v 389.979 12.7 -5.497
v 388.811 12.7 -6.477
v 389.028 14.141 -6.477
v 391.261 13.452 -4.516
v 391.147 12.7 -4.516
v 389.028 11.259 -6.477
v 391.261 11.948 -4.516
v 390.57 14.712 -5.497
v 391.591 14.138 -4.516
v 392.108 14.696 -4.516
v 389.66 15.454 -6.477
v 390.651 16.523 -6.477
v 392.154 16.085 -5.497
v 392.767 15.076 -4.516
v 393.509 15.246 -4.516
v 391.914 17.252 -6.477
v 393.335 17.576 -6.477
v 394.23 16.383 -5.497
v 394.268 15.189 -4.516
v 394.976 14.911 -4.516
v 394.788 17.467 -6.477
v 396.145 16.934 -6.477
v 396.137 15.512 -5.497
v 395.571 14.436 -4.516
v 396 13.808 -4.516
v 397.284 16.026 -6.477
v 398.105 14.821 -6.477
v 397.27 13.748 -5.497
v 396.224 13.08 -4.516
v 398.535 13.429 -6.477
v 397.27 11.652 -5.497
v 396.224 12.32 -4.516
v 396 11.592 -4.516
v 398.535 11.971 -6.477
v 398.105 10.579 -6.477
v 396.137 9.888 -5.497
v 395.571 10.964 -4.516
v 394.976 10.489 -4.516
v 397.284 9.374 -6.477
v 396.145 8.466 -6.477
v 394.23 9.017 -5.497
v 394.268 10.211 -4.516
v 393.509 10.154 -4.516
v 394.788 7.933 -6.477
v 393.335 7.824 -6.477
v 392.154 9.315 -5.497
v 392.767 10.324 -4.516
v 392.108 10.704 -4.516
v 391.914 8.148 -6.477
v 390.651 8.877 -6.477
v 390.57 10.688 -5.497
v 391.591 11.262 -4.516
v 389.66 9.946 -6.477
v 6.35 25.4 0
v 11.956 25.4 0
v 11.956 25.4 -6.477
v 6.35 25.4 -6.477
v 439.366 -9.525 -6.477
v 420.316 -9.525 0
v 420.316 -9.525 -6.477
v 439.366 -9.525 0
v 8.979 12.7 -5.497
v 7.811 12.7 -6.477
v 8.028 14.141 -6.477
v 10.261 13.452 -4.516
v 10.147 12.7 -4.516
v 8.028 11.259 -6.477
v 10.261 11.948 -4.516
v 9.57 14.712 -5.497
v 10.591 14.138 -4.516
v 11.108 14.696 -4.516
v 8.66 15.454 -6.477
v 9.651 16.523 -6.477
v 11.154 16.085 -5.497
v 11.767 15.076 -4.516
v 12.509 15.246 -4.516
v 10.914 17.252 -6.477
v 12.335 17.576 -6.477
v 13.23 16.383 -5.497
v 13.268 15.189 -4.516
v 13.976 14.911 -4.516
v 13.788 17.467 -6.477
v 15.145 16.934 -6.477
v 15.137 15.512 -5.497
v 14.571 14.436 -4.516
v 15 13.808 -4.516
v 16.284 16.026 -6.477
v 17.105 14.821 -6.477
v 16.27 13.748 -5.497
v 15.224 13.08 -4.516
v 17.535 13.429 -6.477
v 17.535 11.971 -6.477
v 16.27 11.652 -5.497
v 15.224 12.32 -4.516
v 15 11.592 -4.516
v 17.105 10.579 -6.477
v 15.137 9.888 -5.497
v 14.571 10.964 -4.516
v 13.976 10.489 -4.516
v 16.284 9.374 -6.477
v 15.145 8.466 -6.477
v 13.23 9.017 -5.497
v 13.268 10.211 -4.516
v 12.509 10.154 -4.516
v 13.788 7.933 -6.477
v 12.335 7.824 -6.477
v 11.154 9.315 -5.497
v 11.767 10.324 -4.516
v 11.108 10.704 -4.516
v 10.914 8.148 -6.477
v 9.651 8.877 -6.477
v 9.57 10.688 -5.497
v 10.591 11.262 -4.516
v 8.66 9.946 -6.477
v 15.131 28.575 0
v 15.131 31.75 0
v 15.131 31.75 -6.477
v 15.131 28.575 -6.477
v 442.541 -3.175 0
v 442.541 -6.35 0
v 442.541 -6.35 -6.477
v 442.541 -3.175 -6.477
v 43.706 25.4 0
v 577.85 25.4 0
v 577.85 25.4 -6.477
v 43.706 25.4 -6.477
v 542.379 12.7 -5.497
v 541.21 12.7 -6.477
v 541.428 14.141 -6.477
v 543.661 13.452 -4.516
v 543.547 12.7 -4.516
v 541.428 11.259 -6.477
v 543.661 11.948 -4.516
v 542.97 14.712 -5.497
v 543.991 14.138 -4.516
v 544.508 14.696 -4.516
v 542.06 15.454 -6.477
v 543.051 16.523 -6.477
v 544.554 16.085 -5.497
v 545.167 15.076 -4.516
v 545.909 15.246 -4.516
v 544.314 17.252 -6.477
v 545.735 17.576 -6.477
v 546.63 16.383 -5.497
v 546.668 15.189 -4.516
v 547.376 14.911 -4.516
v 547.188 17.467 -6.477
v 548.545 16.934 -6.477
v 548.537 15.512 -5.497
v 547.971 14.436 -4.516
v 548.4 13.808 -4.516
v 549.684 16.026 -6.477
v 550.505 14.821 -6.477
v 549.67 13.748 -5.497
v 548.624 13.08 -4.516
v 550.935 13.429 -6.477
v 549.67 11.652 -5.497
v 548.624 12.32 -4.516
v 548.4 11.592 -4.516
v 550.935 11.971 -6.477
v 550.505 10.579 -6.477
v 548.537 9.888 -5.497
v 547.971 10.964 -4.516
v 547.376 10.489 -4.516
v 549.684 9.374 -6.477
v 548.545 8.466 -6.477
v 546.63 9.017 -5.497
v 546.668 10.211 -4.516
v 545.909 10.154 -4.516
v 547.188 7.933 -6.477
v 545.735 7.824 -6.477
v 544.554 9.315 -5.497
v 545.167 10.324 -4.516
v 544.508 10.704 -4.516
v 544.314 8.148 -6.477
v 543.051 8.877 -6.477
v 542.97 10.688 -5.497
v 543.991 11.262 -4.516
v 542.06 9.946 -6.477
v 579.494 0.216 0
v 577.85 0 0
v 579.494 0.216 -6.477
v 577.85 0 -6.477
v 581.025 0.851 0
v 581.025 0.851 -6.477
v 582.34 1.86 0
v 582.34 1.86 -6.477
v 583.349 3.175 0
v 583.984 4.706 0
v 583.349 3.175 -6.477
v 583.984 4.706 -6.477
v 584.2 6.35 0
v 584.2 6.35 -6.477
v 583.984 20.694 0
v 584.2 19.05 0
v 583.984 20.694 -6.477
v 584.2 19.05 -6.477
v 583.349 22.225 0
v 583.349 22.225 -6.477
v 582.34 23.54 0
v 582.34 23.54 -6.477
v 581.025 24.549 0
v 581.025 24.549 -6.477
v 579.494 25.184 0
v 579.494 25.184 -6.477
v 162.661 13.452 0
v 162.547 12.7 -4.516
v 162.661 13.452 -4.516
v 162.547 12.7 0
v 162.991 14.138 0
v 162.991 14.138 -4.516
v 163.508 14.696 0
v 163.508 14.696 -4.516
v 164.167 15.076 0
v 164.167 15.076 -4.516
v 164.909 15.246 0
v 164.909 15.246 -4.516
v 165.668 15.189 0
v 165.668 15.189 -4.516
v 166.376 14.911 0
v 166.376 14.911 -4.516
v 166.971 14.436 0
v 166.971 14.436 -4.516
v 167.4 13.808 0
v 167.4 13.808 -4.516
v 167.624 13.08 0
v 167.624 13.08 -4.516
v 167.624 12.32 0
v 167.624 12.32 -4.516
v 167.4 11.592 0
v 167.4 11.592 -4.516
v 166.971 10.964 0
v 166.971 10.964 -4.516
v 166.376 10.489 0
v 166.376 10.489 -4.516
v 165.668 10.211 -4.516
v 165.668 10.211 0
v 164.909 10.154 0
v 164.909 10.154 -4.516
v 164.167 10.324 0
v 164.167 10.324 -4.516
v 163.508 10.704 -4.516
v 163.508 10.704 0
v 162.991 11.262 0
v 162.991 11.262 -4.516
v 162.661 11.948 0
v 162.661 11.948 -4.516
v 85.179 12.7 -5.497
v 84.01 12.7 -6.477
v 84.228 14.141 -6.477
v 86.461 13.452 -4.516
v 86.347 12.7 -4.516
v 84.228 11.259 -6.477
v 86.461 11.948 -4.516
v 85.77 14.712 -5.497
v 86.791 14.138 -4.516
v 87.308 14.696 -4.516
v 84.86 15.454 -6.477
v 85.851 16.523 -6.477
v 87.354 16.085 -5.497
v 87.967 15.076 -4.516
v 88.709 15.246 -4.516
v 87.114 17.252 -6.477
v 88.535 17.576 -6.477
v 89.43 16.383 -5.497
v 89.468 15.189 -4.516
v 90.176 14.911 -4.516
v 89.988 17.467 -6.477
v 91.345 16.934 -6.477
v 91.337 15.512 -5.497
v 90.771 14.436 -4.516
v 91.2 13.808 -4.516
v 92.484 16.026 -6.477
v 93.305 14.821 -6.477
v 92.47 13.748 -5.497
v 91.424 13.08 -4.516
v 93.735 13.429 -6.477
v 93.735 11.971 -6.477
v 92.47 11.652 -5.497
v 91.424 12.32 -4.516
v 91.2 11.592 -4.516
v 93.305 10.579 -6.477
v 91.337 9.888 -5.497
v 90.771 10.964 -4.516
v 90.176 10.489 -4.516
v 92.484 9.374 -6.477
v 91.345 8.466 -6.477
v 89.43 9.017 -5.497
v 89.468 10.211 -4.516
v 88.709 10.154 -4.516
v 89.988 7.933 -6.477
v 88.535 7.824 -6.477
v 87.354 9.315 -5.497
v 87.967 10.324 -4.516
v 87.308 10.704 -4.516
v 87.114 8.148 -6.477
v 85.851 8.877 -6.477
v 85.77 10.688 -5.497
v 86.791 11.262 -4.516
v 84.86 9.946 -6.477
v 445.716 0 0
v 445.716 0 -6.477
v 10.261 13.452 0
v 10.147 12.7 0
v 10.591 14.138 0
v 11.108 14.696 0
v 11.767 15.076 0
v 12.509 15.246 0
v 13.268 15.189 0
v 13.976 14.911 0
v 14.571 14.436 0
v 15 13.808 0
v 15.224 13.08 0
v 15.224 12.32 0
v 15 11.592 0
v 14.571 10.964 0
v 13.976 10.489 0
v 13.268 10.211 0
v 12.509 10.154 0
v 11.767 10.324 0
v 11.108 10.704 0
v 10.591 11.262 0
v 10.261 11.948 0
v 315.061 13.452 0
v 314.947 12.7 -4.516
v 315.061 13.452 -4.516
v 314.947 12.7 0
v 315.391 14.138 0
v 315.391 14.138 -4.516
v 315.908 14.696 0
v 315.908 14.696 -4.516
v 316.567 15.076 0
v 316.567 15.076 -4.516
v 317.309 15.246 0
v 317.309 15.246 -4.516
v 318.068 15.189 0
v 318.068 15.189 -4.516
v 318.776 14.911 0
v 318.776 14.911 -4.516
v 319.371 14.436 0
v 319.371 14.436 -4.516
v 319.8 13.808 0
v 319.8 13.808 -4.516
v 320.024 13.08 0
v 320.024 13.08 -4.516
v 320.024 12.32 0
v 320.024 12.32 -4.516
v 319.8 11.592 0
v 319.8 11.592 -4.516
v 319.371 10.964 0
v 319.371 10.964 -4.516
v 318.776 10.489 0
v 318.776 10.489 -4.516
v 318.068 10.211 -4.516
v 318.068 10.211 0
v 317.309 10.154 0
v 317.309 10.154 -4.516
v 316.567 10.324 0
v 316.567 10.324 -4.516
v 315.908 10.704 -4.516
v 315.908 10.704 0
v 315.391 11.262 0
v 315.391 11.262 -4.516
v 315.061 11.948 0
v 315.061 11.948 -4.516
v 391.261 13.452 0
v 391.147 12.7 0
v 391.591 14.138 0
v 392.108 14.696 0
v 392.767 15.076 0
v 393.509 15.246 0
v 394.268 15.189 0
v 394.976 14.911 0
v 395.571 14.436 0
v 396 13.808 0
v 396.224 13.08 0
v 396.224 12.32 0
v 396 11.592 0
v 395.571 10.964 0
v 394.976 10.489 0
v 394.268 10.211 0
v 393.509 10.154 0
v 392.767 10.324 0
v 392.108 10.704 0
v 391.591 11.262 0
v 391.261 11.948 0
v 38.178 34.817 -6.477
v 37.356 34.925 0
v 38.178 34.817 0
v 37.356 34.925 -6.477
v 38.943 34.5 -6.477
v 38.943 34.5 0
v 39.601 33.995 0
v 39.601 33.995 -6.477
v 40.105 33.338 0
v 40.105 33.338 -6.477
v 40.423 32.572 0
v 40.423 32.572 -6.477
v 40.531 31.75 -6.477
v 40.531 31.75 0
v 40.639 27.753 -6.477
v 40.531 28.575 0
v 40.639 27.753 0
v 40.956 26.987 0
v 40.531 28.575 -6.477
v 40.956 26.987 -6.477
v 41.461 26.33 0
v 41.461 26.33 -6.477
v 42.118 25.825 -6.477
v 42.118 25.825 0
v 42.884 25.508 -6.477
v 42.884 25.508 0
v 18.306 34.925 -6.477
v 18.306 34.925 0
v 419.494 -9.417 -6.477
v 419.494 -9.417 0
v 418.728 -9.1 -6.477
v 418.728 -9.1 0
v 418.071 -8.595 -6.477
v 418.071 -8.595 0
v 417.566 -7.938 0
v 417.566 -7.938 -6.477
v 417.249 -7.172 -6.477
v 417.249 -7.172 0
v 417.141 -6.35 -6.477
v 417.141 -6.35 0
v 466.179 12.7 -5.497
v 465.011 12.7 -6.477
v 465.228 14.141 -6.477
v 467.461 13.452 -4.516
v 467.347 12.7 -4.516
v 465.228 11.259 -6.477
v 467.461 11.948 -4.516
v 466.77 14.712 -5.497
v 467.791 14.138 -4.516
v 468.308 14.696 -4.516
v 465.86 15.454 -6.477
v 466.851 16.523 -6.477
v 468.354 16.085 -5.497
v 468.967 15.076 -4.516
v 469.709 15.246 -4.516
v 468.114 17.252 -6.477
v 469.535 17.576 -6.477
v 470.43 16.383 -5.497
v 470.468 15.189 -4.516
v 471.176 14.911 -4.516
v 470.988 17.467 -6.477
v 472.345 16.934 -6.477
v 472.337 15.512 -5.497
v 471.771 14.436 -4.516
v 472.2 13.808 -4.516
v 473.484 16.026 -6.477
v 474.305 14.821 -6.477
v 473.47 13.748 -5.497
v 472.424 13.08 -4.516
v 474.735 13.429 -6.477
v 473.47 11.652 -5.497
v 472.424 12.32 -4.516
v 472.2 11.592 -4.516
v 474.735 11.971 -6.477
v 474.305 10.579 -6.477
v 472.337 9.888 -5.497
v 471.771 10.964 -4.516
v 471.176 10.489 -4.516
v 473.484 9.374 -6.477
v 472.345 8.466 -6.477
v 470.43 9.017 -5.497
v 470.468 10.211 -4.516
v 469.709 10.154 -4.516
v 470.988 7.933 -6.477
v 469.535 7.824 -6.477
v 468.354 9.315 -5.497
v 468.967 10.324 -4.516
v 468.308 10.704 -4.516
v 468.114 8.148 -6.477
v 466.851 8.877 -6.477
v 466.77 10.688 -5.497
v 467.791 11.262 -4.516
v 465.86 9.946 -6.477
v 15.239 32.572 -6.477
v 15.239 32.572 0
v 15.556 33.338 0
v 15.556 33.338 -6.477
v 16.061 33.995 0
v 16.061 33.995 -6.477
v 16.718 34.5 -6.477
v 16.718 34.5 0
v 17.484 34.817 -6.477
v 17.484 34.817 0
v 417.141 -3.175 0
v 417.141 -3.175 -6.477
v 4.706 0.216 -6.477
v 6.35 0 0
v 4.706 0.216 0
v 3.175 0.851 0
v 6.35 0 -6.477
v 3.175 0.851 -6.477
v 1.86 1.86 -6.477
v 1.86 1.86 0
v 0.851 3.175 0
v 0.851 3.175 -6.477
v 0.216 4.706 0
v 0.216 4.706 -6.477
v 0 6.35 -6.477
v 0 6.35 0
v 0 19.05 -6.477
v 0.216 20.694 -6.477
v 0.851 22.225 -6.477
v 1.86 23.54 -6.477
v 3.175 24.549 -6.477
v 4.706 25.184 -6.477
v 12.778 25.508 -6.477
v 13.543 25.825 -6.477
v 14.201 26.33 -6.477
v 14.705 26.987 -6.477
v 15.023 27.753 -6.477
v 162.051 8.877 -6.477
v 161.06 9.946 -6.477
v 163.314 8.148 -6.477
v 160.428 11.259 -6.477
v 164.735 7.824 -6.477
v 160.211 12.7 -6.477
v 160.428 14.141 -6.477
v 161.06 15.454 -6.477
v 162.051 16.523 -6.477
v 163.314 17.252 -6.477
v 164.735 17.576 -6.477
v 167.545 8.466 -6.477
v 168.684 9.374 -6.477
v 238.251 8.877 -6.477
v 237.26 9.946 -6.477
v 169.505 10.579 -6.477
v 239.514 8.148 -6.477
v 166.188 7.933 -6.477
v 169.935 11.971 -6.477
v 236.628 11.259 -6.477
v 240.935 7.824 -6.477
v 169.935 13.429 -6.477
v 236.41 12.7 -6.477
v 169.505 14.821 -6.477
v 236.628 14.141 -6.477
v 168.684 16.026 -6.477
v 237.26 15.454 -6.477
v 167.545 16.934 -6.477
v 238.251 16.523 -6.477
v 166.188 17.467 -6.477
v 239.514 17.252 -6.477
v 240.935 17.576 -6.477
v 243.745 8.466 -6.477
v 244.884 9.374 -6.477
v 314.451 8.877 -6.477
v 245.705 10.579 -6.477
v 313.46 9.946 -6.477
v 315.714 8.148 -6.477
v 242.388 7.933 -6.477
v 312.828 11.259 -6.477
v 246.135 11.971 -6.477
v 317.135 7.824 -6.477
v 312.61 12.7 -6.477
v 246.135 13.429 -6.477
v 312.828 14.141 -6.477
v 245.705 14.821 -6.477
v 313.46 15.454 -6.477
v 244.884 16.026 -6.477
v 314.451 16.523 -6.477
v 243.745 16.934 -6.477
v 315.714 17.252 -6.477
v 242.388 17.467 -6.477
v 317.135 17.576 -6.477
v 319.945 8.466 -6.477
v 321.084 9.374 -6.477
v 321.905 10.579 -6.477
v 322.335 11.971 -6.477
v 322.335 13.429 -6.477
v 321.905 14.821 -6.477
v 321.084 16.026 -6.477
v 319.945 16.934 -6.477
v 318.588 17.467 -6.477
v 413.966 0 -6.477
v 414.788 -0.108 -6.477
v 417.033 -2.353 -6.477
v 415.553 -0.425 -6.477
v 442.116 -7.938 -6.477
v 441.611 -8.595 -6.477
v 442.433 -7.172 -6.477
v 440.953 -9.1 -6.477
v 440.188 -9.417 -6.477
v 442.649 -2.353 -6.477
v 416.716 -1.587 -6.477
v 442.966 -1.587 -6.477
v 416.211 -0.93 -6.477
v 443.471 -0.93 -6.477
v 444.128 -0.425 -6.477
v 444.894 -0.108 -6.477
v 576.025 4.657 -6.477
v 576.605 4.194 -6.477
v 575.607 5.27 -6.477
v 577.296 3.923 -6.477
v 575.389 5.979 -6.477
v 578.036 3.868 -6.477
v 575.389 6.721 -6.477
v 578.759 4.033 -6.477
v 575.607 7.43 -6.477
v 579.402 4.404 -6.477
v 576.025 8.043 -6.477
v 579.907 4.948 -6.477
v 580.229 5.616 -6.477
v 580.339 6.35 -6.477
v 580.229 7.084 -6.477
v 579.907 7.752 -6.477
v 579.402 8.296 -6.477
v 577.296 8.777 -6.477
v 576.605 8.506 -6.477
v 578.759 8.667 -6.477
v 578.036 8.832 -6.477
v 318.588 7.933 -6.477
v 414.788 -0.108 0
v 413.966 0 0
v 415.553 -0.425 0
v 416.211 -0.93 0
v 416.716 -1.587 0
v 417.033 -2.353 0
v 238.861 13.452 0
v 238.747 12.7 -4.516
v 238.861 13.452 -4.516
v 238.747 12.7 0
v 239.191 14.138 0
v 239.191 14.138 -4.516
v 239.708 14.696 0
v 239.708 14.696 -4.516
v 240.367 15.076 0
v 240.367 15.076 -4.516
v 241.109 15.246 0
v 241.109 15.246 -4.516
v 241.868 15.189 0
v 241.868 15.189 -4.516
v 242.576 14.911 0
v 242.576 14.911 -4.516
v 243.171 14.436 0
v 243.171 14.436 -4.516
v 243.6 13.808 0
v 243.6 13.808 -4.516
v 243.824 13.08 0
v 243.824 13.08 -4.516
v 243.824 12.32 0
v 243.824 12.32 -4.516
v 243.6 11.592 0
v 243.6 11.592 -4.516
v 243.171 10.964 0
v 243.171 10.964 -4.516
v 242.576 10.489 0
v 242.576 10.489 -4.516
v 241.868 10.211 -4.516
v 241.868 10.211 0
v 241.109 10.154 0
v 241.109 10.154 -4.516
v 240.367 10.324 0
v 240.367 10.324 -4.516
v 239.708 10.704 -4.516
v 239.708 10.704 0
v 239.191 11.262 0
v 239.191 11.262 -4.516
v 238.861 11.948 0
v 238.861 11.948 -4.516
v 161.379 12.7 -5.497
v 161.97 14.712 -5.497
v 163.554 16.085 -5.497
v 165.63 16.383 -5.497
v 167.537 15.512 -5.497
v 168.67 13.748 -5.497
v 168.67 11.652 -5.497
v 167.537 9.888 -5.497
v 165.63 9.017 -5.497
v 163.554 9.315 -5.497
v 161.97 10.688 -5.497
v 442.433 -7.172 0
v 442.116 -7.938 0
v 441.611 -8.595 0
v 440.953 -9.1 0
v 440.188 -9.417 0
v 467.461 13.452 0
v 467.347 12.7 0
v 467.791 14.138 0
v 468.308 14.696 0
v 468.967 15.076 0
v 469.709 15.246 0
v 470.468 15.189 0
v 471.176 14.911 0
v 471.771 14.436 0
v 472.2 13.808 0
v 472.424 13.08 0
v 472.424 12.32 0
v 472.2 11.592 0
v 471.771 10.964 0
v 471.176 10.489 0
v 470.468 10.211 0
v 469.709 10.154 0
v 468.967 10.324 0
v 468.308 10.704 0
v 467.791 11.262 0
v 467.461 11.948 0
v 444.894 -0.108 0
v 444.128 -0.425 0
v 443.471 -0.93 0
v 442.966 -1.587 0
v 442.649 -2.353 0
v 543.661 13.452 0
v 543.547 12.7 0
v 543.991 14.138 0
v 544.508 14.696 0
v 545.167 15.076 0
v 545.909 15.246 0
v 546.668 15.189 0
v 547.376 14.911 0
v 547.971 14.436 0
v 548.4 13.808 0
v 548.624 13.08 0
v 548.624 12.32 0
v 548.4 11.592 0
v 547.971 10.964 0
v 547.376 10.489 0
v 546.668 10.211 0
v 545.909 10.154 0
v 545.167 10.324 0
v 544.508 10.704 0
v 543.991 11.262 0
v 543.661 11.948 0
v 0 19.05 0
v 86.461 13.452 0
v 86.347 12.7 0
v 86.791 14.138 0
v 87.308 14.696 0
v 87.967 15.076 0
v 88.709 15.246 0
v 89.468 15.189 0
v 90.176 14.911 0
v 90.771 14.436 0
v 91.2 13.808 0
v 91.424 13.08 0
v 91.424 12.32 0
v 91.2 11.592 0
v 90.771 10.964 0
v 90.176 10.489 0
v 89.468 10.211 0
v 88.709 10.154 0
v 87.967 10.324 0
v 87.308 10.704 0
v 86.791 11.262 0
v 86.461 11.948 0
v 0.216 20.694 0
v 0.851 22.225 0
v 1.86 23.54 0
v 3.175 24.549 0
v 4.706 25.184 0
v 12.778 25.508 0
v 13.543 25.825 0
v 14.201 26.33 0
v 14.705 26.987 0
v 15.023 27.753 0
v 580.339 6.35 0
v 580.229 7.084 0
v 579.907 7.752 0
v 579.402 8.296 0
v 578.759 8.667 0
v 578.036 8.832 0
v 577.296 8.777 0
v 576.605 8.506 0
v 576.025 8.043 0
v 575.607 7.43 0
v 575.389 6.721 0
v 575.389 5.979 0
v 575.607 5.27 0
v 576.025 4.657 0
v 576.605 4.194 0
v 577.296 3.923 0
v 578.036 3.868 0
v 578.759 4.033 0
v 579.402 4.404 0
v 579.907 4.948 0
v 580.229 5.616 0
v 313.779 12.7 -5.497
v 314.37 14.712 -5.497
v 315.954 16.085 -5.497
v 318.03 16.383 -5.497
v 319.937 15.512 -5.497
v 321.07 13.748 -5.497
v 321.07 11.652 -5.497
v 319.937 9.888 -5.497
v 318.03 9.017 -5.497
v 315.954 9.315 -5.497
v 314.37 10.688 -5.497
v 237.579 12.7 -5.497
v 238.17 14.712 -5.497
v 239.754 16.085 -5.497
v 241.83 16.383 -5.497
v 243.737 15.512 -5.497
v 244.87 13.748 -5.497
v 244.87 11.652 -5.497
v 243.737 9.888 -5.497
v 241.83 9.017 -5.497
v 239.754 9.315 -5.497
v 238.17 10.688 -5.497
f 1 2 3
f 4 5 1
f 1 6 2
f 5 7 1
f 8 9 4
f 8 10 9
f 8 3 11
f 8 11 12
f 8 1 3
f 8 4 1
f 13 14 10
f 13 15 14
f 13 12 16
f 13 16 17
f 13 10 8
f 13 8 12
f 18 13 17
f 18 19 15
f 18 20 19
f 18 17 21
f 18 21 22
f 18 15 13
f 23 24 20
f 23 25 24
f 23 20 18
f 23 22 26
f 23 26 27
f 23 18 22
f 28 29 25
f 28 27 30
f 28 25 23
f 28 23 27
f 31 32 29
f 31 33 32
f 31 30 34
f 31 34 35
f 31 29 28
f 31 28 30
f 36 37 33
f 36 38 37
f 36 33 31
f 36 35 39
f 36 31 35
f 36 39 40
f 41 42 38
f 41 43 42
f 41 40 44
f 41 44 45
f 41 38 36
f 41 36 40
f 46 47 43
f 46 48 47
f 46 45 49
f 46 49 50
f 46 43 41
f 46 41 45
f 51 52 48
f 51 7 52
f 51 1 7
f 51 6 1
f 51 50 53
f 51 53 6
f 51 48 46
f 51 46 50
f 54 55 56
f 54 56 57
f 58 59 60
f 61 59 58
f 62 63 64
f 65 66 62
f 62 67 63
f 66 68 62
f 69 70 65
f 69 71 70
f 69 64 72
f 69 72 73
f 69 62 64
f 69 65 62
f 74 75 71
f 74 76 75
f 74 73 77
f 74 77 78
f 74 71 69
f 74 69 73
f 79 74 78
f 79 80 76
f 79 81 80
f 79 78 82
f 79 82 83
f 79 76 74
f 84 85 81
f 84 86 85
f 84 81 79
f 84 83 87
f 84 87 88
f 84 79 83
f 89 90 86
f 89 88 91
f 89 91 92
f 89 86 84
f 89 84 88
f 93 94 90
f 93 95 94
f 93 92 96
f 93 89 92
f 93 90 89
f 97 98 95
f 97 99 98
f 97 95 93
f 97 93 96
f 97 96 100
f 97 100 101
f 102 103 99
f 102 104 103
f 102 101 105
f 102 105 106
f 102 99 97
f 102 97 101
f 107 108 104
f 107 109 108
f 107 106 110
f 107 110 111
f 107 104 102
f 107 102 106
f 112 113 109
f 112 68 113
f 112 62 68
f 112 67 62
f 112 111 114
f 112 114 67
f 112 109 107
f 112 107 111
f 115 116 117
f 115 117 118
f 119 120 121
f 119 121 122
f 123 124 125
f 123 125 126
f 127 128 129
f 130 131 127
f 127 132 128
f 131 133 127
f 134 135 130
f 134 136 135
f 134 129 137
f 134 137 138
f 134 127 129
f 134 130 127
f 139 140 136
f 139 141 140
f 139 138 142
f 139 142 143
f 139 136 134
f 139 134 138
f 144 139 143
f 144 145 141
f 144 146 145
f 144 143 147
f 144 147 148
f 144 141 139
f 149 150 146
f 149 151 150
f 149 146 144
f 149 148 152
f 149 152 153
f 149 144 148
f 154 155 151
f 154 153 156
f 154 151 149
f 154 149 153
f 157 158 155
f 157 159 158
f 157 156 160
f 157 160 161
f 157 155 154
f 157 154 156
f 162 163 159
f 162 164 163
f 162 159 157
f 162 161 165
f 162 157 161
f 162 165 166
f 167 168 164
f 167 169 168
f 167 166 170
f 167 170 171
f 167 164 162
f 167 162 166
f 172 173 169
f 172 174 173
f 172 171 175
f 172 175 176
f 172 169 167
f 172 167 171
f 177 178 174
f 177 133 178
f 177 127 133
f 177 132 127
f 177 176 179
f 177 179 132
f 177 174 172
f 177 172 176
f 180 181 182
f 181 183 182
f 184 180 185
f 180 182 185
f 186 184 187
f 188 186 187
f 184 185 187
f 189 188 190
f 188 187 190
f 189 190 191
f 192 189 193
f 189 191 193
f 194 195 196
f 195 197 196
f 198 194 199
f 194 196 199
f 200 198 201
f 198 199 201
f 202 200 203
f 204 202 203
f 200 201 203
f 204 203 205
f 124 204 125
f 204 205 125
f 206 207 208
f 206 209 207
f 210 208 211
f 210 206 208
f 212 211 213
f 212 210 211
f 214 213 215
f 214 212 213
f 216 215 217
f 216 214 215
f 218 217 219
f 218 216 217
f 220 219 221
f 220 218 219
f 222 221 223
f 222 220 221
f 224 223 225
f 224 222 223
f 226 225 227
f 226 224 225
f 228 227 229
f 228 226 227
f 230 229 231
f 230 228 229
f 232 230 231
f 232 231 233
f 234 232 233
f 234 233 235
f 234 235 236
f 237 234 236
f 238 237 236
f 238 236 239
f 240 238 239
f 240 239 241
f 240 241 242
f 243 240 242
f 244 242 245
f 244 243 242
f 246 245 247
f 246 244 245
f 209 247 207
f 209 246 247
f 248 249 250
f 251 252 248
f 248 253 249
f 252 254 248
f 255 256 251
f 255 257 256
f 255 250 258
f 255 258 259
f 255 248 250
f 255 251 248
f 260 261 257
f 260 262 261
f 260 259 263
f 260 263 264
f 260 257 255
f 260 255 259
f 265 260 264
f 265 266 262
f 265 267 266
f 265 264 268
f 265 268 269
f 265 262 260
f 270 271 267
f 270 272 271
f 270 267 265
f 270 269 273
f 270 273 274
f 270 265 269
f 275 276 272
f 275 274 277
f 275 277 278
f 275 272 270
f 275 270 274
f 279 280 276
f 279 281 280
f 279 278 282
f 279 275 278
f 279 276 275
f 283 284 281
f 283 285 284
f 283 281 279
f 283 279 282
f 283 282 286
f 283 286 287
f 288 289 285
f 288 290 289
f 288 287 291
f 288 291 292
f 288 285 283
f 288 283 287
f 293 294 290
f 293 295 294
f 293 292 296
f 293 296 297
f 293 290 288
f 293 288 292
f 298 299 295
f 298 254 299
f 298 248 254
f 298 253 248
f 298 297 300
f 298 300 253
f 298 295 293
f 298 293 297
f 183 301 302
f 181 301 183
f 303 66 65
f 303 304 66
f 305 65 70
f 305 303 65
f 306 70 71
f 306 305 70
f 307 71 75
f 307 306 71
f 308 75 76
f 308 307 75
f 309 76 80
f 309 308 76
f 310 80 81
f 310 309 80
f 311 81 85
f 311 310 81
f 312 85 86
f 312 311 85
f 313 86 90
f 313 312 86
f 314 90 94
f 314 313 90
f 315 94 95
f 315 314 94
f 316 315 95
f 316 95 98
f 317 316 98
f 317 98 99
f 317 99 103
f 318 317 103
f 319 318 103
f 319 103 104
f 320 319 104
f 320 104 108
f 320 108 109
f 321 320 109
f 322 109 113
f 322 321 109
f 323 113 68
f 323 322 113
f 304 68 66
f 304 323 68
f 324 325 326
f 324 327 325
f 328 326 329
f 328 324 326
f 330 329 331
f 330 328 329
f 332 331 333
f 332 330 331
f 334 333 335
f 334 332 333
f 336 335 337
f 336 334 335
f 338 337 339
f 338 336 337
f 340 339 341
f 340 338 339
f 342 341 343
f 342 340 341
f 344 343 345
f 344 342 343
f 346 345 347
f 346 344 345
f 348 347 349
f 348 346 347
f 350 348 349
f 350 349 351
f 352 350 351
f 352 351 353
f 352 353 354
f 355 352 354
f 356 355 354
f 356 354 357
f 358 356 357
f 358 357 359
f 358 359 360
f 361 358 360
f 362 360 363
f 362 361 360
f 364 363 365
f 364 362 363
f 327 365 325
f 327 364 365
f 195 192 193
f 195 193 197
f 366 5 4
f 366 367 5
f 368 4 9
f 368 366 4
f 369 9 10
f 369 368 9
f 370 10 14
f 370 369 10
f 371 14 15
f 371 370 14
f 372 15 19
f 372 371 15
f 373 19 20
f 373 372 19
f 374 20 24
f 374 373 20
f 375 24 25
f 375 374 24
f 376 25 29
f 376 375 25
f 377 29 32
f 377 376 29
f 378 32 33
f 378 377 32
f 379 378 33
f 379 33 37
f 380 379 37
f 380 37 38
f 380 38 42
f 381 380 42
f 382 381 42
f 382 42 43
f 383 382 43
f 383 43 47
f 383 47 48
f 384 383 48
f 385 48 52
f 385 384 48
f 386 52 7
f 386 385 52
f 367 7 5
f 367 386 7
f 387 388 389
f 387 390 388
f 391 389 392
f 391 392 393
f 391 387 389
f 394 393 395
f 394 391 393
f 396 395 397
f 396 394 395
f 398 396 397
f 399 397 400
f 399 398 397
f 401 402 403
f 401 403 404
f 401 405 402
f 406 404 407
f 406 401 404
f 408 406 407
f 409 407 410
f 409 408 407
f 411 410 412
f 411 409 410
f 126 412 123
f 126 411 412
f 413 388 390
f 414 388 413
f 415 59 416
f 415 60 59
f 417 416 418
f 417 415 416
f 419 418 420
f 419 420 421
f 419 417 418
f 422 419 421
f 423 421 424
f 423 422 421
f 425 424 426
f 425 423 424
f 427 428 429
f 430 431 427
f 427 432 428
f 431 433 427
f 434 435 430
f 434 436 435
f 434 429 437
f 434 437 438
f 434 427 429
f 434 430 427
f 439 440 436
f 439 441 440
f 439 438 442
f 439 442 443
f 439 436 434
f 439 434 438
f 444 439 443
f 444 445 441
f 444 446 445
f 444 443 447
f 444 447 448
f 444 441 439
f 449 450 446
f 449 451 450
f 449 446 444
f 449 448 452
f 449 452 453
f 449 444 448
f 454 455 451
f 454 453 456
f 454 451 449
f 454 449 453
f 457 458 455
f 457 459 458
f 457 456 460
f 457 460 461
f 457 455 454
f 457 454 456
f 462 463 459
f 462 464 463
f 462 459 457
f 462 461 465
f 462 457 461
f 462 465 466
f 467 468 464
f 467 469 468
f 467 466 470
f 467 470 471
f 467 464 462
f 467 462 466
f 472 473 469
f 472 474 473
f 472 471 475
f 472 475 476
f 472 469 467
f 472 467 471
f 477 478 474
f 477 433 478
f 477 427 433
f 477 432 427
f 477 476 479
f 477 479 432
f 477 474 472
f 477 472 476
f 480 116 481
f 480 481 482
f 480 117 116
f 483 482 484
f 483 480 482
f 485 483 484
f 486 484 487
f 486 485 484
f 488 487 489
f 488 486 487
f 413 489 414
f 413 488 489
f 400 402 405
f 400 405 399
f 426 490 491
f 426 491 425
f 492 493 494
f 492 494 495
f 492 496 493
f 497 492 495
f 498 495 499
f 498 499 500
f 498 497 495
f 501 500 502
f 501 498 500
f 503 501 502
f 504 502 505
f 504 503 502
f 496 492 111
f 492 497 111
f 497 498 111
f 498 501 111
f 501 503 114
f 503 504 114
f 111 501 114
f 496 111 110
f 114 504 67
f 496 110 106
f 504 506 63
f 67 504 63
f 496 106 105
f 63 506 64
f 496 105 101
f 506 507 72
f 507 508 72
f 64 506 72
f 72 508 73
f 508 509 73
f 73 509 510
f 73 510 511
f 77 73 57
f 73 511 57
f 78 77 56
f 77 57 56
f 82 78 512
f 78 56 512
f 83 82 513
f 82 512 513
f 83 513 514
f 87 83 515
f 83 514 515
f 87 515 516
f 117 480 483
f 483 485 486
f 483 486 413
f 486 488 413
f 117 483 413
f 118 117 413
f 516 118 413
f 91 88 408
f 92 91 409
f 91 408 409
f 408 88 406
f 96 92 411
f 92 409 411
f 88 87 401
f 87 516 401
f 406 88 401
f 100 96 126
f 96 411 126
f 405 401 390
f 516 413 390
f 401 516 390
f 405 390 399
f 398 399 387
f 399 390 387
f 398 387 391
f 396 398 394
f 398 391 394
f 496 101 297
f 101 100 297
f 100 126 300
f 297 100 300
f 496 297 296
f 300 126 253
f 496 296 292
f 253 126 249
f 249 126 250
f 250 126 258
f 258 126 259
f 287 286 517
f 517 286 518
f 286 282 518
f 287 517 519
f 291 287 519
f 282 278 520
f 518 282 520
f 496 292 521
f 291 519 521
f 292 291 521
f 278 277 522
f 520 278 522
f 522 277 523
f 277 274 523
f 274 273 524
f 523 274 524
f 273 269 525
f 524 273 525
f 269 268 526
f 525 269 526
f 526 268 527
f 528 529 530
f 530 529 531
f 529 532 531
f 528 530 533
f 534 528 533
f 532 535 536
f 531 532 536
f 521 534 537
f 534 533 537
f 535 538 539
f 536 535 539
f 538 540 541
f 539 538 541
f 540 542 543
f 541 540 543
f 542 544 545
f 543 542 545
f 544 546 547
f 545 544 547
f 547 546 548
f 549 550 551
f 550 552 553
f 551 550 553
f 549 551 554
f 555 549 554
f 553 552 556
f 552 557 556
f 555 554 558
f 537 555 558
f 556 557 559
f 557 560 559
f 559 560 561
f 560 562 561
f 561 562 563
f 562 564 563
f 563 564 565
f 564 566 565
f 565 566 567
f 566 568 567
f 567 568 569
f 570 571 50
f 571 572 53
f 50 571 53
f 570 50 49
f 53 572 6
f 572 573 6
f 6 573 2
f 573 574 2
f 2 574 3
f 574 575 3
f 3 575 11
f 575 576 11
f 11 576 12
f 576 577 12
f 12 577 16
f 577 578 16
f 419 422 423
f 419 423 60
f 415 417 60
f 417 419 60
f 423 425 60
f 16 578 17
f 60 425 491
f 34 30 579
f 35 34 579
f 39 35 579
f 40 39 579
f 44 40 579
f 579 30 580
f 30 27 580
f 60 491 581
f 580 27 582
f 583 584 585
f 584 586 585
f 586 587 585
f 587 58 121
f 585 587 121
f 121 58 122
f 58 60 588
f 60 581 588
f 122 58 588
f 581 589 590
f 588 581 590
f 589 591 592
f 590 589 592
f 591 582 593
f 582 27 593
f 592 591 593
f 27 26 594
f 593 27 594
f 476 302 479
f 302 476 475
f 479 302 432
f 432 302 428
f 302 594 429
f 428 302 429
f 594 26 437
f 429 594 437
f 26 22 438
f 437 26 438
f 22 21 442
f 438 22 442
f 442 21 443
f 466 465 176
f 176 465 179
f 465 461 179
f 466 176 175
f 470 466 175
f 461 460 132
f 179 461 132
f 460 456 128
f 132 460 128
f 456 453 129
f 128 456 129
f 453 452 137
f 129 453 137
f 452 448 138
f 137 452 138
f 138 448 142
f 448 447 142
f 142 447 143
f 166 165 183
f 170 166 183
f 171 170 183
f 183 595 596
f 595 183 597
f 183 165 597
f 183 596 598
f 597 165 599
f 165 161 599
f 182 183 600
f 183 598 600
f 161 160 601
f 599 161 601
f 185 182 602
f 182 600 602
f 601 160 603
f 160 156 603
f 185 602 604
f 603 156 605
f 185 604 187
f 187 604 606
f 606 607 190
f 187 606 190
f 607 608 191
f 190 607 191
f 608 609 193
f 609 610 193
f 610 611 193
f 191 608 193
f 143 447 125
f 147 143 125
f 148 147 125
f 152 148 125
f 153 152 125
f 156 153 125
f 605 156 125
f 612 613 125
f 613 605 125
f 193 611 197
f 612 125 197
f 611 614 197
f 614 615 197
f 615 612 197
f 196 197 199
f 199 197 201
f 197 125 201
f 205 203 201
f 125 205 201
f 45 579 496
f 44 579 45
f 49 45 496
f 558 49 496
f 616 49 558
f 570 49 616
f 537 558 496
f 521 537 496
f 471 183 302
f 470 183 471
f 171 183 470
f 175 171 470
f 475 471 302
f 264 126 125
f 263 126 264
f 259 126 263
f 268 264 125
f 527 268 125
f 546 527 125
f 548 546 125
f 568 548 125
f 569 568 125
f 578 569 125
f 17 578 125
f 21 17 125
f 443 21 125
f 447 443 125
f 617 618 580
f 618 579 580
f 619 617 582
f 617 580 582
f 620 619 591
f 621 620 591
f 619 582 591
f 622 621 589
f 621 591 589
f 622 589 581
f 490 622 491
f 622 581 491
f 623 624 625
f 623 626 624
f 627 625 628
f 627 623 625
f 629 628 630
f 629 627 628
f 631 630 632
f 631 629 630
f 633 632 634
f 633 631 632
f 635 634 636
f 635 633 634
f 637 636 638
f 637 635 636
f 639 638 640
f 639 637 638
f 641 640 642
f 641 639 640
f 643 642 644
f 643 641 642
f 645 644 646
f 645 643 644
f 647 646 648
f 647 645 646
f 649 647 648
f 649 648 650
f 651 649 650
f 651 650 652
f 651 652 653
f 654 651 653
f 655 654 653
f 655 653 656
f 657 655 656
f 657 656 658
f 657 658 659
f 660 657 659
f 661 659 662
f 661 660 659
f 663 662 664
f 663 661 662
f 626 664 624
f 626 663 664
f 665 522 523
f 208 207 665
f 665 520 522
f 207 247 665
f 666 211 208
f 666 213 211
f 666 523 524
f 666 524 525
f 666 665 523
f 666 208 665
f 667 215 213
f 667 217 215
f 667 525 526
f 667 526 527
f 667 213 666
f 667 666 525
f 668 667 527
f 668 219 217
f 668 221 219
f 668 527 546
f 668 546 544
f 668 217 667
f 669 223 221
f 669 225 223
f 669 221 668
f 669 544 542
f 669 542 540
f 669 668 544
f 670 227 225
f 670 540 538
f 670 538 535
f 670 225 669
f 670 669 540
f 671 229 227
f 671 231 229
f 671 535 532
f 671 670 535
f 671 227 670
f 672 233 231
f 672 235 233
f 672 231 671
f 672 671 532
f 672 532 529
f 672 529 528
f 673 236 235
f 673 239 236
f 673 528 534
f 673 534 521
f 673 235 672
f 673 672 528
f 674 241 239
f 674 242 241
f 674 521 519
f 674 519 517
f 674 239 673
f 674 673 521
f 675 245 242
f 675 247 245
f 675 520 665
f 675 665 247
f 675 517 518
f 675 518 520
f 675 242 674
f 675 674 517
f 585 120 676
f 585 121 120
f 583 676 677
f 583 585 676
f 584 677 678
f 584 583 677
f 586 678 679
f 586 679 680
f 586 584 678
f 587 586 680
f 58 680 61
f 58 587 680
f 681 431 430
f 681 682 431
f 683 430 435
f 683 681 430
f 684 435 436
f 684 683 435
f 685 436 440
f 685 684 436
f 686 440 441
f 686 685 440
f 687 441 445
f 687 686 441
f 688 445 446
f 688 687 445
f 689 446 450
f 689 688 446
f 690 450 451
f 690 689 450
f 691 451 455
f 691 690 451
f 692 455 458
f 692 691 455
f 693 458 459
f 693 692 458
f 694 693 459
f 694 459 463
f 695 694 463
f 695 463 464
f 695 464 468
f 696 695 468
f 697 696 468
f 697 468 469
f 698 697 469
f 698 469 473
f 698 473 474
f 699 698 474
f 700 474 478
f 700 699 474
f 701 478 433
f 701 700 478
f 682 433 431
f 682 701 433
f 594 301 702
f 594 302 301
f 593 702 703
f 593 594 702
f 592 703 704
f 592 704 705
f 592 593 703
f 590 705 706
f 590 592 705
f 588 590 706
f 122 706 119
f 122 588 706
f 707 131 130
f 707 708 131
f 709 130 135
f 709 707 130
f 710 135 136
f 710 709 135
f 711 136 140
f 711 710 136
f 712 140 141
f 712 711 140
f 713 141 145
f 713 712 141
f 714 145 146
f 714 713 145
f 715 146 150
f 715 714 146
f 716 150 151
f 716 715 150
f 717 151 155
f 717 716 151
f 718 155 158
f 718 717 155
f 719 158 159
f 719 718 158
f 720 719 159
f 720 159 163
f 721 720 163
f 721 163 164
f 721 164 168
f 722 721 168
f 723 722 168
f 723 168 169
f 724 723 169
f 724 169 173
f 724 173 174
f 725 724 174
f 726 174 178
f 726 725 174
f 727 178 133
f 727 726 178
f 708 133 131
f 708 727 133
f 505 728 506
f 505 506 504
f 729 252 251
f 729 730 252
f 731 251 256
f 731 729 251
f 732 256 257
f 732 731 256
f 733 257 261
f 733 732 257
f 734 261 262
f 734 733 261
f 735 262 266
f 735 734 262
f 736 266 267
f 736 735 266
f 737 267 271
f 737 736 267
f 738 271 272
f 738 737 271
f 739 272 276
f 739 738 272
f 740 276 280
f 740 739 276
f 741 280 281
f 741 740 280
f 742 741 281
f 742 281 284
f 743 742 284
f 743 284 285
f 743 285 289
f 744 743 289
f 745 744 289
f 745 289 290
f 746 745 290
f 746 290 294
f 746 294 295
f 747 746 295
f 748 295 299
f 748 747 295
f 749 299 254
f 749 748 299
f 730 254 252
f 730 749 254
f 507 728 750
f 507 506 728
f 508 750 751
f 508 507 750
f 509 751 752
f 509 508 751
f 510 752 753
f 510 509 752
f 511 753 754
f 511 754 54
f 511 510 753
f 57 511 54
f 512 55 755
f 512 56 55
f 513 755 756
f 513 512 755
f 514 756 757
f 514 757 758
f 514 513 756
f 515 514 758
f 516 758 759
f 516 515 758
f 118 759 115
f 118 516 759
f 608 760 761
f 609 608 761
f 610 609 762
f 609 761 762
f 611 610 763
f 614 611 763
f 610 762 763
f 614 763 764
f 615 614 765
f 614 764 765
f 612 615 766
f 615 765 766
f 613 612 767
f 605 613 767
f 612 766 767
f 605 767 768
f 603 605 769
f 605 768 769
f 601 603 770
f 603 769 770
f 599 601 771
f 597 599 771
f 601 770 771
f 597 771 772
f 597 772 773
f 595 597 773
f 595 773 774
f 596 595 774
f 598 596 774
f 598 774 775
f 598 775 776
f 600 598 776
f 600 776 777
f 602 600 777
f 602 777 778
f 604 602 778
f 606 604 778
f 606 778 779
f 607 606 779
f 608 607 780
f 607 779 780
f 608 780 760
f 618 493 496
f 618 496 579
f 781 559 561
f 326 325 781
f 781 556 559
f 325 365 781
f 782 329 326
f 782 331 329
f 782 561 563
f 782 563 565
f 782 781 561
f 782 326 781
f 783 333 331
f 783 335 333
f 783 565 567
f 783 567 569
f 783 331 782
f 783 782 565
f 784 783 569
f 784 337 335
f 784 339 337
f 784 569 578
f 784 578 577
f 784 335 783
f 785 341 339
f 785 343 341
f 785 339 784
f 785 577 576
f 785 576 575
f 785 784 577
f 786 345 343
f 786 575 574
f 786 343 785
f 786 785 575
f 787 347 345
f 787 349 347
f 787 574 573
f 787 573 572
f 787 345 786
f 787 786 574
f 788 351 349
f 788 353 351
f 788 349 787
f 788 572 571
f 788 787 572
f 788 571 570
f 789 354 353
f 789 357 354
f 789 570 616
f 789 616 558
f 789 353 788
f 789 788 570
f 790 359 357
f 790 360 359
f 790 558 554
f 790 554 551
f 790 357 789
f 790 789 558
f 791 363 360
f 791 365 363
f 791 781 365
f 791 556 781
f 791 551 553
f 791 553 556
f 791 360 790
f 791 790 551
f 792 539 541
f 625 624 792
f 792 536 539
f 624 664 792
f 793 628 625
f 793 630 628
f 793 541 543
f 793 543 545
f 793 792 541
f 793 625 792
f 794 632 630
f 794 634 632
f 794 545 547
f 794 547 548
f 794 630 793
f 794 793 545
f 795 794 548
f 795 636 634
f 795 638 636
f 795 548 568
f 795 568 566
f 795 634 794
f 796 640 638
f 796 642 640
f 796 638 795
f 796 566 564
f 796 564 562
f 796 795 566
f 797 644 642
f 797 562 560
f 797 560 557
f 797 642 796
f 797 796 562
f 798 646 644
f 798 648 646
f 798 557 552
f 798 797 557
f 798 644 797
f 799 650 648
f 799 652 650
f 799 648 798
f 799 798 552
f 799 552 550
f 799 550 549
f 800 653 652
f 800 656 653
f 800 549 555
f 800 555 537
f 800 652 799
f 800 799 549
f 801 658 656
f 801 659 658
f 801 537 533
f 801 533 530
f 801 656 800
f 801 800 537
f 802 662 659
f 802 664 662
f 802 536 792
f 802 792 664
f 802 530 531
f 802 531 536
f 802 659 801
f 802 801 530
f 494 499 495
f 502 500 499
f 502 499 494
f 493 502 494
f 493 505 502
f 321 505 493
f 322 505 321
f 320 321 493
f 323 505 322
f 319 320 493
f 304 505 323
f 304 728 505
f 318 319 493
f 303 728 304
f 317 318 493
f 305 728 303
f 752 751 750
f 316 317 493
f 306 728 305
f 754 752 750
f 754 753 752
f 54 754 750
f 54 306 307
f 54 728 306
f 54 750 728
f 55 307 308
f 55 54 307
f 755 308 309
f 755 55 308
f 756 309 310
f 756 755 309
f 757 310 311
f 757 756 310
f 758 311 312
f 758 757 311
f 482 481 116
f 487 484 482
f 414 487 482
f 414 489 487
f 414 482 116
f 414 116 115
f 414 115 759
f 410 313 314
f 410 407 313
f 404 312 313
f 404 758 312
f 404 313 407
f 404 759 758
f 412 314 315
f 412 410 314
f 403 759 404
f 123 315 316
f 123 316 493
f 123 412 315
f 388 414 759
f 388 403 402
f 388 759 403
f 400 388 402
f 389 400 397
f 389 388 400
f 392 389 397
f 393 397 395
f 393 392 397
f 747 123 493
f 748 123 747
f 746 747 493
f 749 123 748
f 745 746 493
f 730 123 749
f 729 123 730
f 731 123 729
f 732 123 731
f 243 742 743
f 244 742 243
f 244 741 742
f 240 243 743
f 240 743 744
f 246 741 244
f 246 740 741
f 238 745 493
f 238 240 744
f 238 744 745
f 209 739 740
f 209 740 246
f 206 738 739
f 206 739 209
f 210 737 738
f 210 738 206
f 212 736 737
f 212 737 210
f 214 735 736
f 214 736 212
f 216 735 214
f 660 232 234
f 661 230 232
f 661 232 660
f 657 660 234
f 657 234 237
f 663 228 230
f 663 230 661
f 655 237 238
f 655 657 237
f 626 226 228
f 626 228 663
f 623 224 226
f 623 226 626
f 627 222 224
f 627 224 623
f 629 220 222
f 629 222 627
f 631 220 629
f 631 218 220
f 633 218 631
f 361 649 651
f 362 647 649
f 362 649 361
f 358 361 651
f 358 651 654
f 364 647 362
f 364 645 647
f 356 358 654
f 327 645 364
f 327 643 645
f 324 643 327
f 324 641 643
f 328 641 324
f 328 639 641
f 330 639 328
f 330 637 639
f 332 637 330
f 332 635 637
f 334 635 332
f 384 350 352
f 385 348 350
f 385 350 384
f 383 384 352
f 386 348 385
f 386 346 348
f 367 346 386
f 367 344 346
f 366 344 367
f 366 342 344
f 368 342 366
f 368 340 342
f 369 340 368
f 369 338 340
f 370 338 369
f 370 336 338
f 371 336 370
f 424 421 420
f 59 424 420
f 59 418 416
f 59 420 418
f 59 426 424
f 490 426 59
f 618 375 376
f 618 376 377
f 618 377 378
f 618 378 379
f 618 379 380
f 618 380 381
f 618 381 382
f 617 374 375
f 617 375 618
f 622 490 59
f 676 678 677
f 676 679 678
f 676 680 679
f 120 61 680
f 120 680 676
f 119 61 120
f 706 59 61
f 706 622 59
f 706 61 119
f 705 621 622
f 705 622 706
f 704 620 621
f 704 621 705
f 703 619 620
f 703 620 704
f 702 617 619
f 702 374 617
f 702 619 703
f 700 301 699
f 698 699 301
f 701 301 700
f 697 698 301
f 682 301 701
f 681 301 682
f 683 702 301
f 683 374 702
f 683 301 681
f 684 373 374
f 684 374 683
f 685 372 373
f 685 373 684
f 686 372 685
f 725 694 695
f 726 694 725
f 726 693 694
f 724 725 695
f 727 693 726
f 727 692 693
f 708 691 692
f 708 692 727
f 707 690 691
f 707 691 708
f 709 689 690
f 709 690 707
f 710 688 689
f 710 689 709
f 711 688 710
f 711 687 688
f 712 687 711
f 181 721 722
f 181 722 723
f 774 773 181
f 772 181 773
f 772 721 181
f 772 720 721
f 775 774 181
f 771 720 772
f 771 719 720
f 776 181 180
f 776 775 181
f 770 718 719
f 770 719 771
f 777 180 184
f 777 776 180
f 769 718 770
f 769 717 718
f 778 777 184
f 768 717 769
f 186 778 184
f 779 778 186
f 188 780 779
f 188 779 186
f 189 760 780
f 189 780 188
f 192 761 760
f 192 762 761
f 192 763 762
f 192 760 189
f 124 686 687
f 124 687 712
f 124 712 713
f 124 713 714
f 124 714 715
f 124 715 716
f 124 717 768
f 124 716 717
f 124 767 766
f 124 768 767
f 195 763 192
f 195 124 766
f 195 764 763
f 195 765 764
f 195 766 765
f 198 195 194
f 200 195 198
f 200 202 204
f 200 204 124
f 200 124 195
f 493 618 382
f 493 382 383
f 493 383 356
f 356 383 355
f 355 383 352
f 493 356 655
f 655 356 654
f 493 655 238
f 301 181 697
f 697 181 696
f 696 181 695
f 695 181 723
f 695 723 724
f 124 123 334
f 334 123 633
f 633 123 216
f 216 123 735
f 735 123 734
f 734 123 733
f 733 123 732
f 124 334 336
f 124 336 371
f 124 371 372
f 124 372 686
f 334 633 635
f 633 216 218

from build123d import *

# Parameters (mm, degrees)
SKETCH1_R                                          = 2.4892
BOSS_EXTRUDE1_DEPTH                                = 6.477
FILLET2_R                                          = 6.35
CSK_FOR_10_FLAT_HEAD_MACHINE_SCREW_100_D           = 5.1054
CSK_FOR_10_FLAT_HEAD_MACHINE_SCREW_100_CSINK_D     = 9.779
CSK_FOR_10_FLAT_HEAD_MACHINE_SCREW_100_CSINK_ANGLE = 100
LPATTERN1_COUNT                                    = 8
LPATTERN1_PITCH                                    = 76.2
FILLET3_R                                          = 3.175


with BuildPart() as part:
    # Sketch1 → Boss-Extrude1 (new body)
    with BuildSketch(Plane.XY):
        Polygon((0, 0), (40.53078, 0), (417.140898, 0), (417.140898, -9.525), (442.540898, -9.525), (442.540898, 0), (584.2, 0), (584.2, 25.4), (40.53078, 25.4), (40.53078, 34.925), (15.13078, 34.925), (15.13078, 25.4), (0, 25.4), align=None)
        with Locations((577.85, 6.35)):
            Circle(SKETCH1_R, mode=Mode.SUBTRACT)
    extrude(amount=BOSS_EXTRUDE1_DEPTH)

    # Fillet2
    fillet2_edges = [part.edges().sort_by_distance(p)[0] for p in [
        (0, 0, 3.2385),
        (0, 25.4, 3.2385),
        (584.2, 25.4, 3.2385),
        (584.2, 0, 3.2385),
    ]]
    fillet(fillet2_edges, radius=FILLET2_R)

    # CSK for #10 Flat Head Machine Screw (100)1 (through all)
    with Locations(Plane.XY.offset(6.477)):
        with Locations((546.1, 12.7)):
            csk_for_10_flat_head_machine_screw_100 = CounterSinkHole(CSK_FOR_10_FLAT_HEAD_MACHINE_SCREW_100_D / 2, CSK_FOR_10_FLAT_HEAD_MACHINE_SCREW_100_CSINK_D / 2, counter_sink_angle=CSK_FOR_10_FLAT_HEAD_MACHINE_SCREW_100_CSINK_ANGLE)

    # LPattern1: CSK for #10 Flat Head Machine Screw (100)1 ×8
    with Locations(*[(-i * LPATTERN1_PITCH, 0, 0) for i in range(1, LPATTERN1_COUNT)]):
        add(csk_for_10_flat_head_machine_screw_100, mode=Mode.SUBTRACT)


with BuildPart() as body_2:
    # Mirror2: mirrored copy
    add(part.part.mirror(Plane.XY))

    # Fillet3
    fillet3_edges = [body_2.edges().sort_by_distance(p)[0] for p in [
        (442.540898, -9.525, -3.2385),
        (417.140898, -9.525, -3.2385),
        (417.140898, 0, -3.2385),
        (15.13078, 25.4, -3.2385),
        (15.13078, 34.925, -3.2385),
        (40.53078, 34.925, -3.2385),
        (40.53078, 25.4, -3.2385),
        (442.540898, 0, -3.2385),
    ]]
    fillet(fillet3_edges, radius=FILLET3_R)


solid = body_2.part
